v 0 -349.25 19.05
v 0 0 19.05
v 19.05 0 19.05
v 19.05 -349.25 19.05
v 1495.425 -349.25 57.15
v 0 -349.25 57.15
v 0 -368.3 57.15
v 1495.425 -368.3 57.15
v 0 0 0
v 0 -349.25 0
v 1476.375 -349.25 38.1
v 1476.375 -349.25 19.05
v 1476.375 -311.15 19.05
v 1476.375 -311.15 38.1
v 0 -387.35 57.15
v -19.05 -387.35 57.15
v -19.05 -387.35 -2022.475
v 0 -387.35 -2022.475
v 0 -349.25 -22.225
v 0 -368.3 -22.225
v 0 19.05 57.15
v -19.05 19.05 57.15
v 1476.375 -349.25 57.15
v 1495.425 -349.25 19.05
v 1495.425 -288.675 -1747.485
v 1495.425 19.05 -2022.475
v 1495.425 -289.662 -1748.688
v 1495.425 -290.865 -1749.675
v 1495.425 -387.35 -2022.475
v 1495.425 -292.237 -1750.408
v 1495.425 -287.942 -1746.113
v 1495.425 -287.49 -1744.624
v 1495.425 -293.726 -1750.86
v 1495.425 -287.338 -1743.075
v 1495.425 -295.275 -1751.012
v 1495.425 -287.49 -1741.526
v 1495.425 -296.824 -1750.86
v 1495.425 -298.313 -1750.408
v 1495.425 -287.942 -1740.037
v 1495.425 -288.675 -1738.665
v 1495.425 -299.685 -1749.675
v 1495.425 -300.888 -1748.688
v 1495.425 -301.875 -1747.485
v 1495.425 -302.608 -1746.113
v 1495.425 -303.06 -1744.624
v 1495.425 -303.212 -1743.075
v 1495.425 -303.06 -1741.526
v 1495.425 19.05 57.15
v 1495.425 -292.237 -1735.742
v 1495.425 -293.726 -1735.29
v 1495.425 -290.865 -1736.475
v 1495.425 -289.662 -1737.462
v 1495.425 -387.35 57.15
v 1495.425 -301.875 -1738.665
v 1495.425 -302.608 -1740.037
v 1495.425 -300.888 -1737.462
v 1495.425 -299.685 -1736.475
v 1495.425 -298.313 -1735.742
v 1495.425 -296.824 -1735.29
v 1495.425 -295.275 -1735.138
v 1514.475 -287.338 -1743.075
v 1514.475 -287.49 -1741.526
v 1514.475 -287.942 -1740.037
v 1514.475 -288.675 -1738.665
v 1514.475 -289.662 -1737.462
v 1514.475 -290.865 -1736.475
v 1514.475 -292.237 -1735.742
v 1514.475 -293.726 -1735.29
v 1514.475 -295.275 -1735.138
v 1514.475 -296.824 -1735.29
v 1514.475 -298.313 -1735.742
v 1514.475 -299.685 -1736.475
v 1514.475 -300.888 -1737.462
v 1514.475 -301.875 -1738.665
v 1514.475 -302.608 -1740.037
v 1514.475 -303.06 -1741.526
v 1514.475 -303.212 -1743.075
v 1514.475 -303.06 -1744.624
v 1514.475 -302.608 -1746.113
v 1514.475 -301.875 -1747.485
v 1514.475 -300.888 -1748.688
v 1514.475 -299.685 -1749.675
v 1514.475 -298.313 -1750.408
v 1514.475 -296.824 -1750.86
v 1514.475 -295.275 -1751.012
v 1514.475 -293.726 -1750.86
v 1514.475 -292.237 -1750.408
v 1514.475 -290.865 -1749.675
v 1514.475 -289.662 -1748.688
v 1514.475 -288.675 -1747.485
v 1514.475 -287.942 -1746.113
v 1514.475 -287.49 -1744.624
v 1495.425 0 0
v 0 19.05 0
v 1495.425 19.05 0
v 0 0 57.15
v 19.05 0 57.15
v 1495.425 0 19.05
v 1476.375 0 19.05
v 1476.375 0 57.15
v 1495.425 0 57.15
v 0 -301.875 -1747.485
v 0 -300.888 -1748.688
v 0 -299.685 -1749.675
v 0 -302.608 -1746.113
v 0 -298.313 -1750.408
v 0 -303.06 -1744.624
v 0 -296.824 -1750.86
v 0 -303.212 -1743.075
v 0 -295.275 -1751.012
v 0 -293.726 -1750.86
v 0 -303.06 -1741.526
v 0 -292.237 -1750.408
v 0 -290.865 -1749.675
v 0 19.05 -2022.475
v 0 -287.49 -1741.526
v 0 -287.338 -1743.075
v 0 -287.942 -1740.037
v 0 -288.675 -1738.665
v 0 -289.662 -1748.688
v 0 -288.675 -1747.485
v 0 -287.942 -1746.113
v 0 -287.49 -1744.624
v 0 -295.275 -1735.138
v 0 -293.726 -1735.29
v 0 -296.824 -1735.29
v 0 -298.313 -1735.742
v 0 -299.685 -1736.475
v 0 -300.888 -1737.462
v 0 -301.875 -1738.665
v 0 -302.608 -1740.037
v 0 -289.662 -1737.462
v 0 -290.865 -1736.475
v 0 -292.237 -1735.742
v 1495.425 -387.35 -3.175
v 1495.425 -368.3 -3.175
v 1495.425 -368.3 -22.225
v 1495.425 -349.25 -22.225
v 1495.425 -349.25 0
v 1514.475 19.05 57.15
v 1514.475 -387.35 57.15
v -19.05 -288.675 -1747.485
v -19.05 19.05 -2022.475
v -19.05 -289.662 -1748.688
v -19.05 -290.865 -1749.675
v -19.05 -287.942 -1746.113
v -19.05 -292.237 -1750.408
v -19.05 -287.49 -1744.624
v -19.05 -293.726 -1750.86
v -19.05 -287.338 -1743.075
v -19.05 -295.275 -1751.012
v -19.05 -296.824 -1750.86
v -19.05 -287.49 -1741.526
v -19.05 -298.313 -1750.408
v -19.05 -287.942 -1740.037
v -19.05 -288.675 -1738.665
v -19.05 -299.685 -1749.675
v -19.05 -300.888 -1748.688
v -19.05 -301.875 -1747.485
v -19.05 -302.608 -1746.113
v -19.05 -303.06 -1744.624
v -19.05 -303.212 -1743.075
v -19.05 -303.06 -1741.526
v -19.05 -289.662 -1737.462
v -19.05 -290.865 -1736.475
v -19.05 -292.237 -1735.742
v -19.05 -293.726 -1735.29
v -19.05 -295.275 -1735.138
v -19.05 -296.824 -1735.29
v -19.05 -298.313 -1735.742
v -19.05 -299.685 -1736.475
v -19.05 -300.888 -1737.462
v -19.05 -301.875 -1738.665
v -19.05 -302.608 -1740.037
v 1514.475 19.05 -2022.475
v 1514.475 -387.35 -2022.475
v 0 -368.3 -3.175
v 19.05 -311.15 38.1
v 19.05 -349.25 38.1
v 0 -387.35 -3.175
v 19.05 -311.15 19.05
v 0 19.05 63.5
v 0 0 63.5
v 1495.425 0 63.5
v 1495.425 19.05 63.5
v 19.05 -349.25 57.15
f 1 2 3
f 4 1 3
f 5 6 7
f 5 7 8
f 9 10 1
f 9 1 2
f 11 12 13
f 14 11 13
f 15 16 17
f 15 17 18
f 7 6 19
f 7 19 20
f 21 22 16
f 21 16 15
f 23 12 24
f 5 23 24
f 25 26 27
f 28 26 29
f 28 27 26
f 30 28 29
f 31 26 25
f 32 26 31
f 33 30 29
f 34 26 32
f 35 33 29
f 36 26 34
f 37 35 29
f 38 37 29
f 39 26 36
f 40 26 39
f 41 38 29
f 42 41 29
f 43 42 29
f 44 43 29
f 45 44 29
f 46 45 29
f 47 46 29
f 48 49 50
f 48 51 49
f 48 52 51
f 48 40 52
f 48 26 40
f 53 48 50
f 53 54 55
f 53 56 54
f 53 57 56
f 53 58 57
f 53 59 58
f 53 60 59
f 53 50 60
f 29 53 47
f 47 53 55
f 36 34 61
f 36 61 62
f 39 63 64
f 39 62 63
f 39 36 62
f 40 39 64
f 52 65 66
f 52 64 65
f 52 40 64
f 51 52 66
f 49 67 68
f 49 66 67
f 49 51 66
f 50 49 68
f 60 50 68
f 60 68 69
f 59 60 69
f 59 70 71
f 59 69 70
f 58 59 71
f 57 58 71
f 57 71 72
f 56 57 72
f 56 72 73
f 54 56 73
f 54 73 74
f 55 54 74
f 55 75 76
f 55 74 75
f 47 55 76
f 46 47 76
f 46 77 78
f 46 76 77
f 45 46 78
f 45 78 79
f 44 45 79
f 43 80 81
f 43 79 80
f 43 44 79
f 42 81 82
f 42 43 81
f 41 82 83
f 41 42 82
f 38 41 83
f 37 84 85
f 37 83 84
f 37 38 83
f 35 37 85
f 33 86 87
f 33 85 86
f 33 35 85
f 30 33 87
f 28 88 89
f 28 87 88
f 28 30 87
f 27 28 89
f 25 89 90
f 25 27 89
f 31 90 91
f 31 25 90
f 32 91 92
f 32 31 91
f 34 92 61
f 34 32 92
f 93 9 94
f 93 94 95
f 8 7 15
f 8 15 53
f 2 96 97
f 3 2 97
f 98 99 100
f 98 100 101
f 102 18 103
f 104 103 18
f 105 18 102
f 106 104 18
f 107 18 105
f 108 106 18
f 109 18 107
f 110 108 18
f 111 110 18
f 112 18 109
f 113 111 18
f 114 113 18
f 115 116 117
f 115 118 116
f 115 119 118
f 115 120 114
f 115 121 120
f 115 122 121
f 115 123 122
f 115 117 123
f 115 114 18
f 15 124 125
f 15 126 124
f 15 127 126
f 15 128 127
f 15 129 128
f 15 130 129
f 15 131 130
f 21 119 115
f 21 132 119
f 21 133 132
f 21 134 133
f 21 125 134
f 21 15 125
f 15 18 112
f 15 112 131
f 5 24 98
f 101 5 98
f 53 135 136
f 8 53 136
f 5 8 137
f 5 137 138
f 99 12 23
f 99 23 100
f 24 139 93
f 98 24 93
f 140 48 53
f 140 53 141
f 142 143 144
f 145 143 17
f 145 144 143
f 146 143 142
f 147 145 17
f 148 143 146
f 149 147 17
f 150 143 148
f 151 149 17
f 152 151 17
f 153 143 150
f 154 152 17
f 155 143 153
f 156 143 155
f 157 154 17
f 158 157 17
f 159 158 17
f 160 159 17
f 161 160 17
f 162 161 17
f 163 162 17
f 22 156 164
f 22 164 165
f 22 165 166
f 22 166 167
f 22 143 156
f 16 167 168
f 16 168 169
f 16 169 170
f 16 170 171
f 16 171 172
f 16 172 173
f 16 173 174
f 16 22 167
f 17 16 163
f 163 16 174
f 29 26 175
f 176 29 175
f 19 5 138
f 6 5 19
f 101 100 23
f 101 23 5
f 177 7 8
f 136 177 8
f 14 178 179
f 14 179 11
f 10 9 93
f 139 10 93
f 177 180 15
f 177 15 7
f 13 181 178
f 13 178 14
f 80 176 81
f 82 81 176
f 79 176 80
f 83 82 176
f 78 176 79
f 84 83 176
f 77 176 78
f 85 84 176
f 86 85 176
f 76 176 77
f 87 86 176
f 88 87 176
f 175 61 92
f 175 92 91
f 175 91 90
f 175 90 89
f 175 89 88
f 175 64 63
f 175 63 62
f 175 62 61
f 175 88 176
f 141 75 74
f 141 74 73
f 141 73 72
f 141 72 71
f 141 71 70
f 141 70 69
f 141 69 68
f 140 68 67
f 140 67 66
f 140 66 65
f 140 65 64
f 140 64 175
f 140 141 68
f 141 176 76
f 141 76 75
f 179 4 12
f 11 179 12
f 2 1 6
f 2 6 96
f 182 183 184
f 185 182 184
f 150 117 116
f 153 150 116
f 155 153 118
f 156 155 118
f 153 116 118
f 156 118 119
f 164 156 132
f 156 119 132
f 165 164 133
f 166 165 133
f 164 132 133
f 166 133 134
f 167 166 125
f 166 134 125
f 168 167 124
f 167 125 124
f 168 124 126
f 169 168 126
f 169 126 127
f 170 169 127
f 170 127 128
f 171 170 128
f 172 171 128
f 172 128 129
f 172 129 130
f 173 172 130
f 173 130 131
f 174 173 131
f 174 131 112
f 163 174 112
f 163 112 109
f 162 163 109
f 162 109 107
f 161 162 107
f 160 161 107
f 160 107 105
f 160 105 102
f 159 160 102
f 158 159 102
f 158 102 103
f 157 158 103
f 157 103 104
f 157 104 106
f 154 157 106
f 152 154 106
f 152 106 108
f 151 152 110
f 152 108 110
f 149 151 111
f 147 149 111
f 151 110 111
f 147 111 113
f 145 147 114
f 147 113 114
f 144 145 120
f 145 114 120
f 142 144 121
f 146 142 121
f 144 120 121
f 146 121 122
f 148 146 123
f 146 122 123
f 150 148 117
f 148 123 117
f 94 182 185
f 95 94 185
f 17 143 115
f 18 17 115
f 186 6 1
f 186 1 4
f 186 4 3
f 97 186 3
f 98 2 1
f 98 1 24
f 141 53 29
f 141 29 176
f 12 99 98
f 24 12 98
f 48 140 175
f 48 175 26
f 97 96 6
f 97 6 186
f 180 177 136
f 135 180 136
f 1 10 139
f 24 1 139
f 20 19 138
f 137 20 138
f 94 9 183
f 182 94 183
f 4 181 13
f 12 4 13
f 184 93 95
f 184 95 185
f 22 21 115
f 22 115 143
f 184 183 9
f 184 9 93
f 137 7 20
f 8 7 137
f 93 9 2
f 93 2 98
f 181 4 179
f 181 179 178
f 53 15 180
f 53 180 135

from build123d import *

# Parameters (mm, degrees)
F0_W           = 1495.425
F0_H           = 349.25
F1_DEPTH       = 19.05
F2_W           = 19.05
F2_H           = 349.25
F3_DEPTH       = 38.1
F4_W           = 1495.425
F4_H           = 63.5
F5_DEPTH       = 19.05
F7_DEPTH       = 79.375
F6_W           = 1495.425
F6_H           = 19.05
F8_DEPTH       = 60.325
F9_W           = 1457.325
F9_H           = 38.1
F10_DEPTH      = 19.05
F11_DEPTH      = 2079.625
F12_R          = 7.9375
F13_DEPTH      = 19.051
F13_DEPTH_BACK = 1514.476


with BuildPart() as f1:
    # F0 (on Top) → F1 (new body)
    with BuildSketch(Plane.XY):
        with Locations((747.7125, -174.625)):
            Rectangle(F0_W, F0_H)
    extrude(amount=F1_DEPTH)


with BuildPart() as f3:
    # F2 (on face) → F3 (new body)
    with BuildSketch(Plane.XY.offset(19.05)):
        with Locations((9.525, -174.625)):
            Rectangle(F2_W, F2_H)
    extrude(amount=F3_DEPTH)


with BuildPart() as f3b:
    # F2 (on face) → F3, piece 2 (new body)
    with BuildSketch(Plane.XY.offset(19.05)):
        with Locations((1485.9, -174.625)):
            Rectangle(F2_W, F2_H)
    extrude(amount=F3_DEPTH)


with BuildPart() as f5:
    # F4 (on Front) → F5 (new body)
    with BuildSketch(Plane.XZ):
        with Locations((747.7125, 31.75)):
            Rectangle(F4_W, F4_H)
    extrude(amount=-F5_DEPTH)


with BuildPart() as f7:
    # F6 (on face) → F7 (new body)
    with BuildSketch(Plane.XY.offset(57.15)):
        Polygon((19.05, -349.25), (0, -349.25), (0, -368.3), (1495.425, -368.3), (1495.425, -349.25), align=None)
    extrude(amount=-F7_DEPTH)


with BuildPart() as f8:
    # F6 (on face) → F8 (new body)
    with BuildSketch(Plane.XY.offset(57.15)):
        with Locations((747.7125, -377.825)):
            Rectangle(F6_W, F6_H)
    extrude(amount=-F8_DEPTH)


with BuildPart() as f10:
    # F9 (on face) → F10 (new body)
    with BuildSketch(Plane.XY.offset(19.05)):
        with Locations((747.7125, -330.2)):
            Rectangle(F9_W, F9_H)
    extrude(amount=F10_DEPTH)


with BuildPart() as f11:
    # F6 (on face) → F11 (new body)
    with BuildSketch(Plane.XY.offset(57.15)):
        Polygon((0, -368.3), (0, -349.25), (0, 0), (0, 19.05), (-19.05, 19.05), (-19.05, -387.35), (0, -387.35), align=None)
    extrude(amount=-F11_DEPTH)


with BuildPart() as f11b:
    # F6 (on face) → F11, piece 2 (new body)
    with BuildSketch(Plane.XY.offset(57.15)):
        Polygon((1495.425, 19.05), (1495.425, -349.25), (1495.425, -368.3), (1495.425, -387.35), (1514.475, -387.35), (1514.475, 19.05), align=None)
    extrude(amount=-F11_DEPTH)


with BuildPart() as f13_tool:
    # F12 (on face) → F13 (new body, two sides)
    with BuildSketch(Plane.YZ) as f13_sk:
        with Locations((-295.275, -1743.075)):
            Circle(F12_R)
    extrude(amount=-F13_DEPTH)
    extrude(f13_sk.sketch, amount=F13_DEPTH_BACK)


with BuildPart() as f11_1:
    add(f11.part)

    # F13: cut by f13_tool
    add(f13_tool.part, mode=Mode.SUBTRACT)


with BuildPart() as f11b_1:
    add(f11b.part)

    # F13: cut by f13_tool
    add(f13_tool.part, mode=Mode.SUBTRACT)


solid = Compound([f1.part, f3.part, f3b.part, f5.part, f7.part, f8.part, f10.part, f11_1.part, f11b_1.part])
